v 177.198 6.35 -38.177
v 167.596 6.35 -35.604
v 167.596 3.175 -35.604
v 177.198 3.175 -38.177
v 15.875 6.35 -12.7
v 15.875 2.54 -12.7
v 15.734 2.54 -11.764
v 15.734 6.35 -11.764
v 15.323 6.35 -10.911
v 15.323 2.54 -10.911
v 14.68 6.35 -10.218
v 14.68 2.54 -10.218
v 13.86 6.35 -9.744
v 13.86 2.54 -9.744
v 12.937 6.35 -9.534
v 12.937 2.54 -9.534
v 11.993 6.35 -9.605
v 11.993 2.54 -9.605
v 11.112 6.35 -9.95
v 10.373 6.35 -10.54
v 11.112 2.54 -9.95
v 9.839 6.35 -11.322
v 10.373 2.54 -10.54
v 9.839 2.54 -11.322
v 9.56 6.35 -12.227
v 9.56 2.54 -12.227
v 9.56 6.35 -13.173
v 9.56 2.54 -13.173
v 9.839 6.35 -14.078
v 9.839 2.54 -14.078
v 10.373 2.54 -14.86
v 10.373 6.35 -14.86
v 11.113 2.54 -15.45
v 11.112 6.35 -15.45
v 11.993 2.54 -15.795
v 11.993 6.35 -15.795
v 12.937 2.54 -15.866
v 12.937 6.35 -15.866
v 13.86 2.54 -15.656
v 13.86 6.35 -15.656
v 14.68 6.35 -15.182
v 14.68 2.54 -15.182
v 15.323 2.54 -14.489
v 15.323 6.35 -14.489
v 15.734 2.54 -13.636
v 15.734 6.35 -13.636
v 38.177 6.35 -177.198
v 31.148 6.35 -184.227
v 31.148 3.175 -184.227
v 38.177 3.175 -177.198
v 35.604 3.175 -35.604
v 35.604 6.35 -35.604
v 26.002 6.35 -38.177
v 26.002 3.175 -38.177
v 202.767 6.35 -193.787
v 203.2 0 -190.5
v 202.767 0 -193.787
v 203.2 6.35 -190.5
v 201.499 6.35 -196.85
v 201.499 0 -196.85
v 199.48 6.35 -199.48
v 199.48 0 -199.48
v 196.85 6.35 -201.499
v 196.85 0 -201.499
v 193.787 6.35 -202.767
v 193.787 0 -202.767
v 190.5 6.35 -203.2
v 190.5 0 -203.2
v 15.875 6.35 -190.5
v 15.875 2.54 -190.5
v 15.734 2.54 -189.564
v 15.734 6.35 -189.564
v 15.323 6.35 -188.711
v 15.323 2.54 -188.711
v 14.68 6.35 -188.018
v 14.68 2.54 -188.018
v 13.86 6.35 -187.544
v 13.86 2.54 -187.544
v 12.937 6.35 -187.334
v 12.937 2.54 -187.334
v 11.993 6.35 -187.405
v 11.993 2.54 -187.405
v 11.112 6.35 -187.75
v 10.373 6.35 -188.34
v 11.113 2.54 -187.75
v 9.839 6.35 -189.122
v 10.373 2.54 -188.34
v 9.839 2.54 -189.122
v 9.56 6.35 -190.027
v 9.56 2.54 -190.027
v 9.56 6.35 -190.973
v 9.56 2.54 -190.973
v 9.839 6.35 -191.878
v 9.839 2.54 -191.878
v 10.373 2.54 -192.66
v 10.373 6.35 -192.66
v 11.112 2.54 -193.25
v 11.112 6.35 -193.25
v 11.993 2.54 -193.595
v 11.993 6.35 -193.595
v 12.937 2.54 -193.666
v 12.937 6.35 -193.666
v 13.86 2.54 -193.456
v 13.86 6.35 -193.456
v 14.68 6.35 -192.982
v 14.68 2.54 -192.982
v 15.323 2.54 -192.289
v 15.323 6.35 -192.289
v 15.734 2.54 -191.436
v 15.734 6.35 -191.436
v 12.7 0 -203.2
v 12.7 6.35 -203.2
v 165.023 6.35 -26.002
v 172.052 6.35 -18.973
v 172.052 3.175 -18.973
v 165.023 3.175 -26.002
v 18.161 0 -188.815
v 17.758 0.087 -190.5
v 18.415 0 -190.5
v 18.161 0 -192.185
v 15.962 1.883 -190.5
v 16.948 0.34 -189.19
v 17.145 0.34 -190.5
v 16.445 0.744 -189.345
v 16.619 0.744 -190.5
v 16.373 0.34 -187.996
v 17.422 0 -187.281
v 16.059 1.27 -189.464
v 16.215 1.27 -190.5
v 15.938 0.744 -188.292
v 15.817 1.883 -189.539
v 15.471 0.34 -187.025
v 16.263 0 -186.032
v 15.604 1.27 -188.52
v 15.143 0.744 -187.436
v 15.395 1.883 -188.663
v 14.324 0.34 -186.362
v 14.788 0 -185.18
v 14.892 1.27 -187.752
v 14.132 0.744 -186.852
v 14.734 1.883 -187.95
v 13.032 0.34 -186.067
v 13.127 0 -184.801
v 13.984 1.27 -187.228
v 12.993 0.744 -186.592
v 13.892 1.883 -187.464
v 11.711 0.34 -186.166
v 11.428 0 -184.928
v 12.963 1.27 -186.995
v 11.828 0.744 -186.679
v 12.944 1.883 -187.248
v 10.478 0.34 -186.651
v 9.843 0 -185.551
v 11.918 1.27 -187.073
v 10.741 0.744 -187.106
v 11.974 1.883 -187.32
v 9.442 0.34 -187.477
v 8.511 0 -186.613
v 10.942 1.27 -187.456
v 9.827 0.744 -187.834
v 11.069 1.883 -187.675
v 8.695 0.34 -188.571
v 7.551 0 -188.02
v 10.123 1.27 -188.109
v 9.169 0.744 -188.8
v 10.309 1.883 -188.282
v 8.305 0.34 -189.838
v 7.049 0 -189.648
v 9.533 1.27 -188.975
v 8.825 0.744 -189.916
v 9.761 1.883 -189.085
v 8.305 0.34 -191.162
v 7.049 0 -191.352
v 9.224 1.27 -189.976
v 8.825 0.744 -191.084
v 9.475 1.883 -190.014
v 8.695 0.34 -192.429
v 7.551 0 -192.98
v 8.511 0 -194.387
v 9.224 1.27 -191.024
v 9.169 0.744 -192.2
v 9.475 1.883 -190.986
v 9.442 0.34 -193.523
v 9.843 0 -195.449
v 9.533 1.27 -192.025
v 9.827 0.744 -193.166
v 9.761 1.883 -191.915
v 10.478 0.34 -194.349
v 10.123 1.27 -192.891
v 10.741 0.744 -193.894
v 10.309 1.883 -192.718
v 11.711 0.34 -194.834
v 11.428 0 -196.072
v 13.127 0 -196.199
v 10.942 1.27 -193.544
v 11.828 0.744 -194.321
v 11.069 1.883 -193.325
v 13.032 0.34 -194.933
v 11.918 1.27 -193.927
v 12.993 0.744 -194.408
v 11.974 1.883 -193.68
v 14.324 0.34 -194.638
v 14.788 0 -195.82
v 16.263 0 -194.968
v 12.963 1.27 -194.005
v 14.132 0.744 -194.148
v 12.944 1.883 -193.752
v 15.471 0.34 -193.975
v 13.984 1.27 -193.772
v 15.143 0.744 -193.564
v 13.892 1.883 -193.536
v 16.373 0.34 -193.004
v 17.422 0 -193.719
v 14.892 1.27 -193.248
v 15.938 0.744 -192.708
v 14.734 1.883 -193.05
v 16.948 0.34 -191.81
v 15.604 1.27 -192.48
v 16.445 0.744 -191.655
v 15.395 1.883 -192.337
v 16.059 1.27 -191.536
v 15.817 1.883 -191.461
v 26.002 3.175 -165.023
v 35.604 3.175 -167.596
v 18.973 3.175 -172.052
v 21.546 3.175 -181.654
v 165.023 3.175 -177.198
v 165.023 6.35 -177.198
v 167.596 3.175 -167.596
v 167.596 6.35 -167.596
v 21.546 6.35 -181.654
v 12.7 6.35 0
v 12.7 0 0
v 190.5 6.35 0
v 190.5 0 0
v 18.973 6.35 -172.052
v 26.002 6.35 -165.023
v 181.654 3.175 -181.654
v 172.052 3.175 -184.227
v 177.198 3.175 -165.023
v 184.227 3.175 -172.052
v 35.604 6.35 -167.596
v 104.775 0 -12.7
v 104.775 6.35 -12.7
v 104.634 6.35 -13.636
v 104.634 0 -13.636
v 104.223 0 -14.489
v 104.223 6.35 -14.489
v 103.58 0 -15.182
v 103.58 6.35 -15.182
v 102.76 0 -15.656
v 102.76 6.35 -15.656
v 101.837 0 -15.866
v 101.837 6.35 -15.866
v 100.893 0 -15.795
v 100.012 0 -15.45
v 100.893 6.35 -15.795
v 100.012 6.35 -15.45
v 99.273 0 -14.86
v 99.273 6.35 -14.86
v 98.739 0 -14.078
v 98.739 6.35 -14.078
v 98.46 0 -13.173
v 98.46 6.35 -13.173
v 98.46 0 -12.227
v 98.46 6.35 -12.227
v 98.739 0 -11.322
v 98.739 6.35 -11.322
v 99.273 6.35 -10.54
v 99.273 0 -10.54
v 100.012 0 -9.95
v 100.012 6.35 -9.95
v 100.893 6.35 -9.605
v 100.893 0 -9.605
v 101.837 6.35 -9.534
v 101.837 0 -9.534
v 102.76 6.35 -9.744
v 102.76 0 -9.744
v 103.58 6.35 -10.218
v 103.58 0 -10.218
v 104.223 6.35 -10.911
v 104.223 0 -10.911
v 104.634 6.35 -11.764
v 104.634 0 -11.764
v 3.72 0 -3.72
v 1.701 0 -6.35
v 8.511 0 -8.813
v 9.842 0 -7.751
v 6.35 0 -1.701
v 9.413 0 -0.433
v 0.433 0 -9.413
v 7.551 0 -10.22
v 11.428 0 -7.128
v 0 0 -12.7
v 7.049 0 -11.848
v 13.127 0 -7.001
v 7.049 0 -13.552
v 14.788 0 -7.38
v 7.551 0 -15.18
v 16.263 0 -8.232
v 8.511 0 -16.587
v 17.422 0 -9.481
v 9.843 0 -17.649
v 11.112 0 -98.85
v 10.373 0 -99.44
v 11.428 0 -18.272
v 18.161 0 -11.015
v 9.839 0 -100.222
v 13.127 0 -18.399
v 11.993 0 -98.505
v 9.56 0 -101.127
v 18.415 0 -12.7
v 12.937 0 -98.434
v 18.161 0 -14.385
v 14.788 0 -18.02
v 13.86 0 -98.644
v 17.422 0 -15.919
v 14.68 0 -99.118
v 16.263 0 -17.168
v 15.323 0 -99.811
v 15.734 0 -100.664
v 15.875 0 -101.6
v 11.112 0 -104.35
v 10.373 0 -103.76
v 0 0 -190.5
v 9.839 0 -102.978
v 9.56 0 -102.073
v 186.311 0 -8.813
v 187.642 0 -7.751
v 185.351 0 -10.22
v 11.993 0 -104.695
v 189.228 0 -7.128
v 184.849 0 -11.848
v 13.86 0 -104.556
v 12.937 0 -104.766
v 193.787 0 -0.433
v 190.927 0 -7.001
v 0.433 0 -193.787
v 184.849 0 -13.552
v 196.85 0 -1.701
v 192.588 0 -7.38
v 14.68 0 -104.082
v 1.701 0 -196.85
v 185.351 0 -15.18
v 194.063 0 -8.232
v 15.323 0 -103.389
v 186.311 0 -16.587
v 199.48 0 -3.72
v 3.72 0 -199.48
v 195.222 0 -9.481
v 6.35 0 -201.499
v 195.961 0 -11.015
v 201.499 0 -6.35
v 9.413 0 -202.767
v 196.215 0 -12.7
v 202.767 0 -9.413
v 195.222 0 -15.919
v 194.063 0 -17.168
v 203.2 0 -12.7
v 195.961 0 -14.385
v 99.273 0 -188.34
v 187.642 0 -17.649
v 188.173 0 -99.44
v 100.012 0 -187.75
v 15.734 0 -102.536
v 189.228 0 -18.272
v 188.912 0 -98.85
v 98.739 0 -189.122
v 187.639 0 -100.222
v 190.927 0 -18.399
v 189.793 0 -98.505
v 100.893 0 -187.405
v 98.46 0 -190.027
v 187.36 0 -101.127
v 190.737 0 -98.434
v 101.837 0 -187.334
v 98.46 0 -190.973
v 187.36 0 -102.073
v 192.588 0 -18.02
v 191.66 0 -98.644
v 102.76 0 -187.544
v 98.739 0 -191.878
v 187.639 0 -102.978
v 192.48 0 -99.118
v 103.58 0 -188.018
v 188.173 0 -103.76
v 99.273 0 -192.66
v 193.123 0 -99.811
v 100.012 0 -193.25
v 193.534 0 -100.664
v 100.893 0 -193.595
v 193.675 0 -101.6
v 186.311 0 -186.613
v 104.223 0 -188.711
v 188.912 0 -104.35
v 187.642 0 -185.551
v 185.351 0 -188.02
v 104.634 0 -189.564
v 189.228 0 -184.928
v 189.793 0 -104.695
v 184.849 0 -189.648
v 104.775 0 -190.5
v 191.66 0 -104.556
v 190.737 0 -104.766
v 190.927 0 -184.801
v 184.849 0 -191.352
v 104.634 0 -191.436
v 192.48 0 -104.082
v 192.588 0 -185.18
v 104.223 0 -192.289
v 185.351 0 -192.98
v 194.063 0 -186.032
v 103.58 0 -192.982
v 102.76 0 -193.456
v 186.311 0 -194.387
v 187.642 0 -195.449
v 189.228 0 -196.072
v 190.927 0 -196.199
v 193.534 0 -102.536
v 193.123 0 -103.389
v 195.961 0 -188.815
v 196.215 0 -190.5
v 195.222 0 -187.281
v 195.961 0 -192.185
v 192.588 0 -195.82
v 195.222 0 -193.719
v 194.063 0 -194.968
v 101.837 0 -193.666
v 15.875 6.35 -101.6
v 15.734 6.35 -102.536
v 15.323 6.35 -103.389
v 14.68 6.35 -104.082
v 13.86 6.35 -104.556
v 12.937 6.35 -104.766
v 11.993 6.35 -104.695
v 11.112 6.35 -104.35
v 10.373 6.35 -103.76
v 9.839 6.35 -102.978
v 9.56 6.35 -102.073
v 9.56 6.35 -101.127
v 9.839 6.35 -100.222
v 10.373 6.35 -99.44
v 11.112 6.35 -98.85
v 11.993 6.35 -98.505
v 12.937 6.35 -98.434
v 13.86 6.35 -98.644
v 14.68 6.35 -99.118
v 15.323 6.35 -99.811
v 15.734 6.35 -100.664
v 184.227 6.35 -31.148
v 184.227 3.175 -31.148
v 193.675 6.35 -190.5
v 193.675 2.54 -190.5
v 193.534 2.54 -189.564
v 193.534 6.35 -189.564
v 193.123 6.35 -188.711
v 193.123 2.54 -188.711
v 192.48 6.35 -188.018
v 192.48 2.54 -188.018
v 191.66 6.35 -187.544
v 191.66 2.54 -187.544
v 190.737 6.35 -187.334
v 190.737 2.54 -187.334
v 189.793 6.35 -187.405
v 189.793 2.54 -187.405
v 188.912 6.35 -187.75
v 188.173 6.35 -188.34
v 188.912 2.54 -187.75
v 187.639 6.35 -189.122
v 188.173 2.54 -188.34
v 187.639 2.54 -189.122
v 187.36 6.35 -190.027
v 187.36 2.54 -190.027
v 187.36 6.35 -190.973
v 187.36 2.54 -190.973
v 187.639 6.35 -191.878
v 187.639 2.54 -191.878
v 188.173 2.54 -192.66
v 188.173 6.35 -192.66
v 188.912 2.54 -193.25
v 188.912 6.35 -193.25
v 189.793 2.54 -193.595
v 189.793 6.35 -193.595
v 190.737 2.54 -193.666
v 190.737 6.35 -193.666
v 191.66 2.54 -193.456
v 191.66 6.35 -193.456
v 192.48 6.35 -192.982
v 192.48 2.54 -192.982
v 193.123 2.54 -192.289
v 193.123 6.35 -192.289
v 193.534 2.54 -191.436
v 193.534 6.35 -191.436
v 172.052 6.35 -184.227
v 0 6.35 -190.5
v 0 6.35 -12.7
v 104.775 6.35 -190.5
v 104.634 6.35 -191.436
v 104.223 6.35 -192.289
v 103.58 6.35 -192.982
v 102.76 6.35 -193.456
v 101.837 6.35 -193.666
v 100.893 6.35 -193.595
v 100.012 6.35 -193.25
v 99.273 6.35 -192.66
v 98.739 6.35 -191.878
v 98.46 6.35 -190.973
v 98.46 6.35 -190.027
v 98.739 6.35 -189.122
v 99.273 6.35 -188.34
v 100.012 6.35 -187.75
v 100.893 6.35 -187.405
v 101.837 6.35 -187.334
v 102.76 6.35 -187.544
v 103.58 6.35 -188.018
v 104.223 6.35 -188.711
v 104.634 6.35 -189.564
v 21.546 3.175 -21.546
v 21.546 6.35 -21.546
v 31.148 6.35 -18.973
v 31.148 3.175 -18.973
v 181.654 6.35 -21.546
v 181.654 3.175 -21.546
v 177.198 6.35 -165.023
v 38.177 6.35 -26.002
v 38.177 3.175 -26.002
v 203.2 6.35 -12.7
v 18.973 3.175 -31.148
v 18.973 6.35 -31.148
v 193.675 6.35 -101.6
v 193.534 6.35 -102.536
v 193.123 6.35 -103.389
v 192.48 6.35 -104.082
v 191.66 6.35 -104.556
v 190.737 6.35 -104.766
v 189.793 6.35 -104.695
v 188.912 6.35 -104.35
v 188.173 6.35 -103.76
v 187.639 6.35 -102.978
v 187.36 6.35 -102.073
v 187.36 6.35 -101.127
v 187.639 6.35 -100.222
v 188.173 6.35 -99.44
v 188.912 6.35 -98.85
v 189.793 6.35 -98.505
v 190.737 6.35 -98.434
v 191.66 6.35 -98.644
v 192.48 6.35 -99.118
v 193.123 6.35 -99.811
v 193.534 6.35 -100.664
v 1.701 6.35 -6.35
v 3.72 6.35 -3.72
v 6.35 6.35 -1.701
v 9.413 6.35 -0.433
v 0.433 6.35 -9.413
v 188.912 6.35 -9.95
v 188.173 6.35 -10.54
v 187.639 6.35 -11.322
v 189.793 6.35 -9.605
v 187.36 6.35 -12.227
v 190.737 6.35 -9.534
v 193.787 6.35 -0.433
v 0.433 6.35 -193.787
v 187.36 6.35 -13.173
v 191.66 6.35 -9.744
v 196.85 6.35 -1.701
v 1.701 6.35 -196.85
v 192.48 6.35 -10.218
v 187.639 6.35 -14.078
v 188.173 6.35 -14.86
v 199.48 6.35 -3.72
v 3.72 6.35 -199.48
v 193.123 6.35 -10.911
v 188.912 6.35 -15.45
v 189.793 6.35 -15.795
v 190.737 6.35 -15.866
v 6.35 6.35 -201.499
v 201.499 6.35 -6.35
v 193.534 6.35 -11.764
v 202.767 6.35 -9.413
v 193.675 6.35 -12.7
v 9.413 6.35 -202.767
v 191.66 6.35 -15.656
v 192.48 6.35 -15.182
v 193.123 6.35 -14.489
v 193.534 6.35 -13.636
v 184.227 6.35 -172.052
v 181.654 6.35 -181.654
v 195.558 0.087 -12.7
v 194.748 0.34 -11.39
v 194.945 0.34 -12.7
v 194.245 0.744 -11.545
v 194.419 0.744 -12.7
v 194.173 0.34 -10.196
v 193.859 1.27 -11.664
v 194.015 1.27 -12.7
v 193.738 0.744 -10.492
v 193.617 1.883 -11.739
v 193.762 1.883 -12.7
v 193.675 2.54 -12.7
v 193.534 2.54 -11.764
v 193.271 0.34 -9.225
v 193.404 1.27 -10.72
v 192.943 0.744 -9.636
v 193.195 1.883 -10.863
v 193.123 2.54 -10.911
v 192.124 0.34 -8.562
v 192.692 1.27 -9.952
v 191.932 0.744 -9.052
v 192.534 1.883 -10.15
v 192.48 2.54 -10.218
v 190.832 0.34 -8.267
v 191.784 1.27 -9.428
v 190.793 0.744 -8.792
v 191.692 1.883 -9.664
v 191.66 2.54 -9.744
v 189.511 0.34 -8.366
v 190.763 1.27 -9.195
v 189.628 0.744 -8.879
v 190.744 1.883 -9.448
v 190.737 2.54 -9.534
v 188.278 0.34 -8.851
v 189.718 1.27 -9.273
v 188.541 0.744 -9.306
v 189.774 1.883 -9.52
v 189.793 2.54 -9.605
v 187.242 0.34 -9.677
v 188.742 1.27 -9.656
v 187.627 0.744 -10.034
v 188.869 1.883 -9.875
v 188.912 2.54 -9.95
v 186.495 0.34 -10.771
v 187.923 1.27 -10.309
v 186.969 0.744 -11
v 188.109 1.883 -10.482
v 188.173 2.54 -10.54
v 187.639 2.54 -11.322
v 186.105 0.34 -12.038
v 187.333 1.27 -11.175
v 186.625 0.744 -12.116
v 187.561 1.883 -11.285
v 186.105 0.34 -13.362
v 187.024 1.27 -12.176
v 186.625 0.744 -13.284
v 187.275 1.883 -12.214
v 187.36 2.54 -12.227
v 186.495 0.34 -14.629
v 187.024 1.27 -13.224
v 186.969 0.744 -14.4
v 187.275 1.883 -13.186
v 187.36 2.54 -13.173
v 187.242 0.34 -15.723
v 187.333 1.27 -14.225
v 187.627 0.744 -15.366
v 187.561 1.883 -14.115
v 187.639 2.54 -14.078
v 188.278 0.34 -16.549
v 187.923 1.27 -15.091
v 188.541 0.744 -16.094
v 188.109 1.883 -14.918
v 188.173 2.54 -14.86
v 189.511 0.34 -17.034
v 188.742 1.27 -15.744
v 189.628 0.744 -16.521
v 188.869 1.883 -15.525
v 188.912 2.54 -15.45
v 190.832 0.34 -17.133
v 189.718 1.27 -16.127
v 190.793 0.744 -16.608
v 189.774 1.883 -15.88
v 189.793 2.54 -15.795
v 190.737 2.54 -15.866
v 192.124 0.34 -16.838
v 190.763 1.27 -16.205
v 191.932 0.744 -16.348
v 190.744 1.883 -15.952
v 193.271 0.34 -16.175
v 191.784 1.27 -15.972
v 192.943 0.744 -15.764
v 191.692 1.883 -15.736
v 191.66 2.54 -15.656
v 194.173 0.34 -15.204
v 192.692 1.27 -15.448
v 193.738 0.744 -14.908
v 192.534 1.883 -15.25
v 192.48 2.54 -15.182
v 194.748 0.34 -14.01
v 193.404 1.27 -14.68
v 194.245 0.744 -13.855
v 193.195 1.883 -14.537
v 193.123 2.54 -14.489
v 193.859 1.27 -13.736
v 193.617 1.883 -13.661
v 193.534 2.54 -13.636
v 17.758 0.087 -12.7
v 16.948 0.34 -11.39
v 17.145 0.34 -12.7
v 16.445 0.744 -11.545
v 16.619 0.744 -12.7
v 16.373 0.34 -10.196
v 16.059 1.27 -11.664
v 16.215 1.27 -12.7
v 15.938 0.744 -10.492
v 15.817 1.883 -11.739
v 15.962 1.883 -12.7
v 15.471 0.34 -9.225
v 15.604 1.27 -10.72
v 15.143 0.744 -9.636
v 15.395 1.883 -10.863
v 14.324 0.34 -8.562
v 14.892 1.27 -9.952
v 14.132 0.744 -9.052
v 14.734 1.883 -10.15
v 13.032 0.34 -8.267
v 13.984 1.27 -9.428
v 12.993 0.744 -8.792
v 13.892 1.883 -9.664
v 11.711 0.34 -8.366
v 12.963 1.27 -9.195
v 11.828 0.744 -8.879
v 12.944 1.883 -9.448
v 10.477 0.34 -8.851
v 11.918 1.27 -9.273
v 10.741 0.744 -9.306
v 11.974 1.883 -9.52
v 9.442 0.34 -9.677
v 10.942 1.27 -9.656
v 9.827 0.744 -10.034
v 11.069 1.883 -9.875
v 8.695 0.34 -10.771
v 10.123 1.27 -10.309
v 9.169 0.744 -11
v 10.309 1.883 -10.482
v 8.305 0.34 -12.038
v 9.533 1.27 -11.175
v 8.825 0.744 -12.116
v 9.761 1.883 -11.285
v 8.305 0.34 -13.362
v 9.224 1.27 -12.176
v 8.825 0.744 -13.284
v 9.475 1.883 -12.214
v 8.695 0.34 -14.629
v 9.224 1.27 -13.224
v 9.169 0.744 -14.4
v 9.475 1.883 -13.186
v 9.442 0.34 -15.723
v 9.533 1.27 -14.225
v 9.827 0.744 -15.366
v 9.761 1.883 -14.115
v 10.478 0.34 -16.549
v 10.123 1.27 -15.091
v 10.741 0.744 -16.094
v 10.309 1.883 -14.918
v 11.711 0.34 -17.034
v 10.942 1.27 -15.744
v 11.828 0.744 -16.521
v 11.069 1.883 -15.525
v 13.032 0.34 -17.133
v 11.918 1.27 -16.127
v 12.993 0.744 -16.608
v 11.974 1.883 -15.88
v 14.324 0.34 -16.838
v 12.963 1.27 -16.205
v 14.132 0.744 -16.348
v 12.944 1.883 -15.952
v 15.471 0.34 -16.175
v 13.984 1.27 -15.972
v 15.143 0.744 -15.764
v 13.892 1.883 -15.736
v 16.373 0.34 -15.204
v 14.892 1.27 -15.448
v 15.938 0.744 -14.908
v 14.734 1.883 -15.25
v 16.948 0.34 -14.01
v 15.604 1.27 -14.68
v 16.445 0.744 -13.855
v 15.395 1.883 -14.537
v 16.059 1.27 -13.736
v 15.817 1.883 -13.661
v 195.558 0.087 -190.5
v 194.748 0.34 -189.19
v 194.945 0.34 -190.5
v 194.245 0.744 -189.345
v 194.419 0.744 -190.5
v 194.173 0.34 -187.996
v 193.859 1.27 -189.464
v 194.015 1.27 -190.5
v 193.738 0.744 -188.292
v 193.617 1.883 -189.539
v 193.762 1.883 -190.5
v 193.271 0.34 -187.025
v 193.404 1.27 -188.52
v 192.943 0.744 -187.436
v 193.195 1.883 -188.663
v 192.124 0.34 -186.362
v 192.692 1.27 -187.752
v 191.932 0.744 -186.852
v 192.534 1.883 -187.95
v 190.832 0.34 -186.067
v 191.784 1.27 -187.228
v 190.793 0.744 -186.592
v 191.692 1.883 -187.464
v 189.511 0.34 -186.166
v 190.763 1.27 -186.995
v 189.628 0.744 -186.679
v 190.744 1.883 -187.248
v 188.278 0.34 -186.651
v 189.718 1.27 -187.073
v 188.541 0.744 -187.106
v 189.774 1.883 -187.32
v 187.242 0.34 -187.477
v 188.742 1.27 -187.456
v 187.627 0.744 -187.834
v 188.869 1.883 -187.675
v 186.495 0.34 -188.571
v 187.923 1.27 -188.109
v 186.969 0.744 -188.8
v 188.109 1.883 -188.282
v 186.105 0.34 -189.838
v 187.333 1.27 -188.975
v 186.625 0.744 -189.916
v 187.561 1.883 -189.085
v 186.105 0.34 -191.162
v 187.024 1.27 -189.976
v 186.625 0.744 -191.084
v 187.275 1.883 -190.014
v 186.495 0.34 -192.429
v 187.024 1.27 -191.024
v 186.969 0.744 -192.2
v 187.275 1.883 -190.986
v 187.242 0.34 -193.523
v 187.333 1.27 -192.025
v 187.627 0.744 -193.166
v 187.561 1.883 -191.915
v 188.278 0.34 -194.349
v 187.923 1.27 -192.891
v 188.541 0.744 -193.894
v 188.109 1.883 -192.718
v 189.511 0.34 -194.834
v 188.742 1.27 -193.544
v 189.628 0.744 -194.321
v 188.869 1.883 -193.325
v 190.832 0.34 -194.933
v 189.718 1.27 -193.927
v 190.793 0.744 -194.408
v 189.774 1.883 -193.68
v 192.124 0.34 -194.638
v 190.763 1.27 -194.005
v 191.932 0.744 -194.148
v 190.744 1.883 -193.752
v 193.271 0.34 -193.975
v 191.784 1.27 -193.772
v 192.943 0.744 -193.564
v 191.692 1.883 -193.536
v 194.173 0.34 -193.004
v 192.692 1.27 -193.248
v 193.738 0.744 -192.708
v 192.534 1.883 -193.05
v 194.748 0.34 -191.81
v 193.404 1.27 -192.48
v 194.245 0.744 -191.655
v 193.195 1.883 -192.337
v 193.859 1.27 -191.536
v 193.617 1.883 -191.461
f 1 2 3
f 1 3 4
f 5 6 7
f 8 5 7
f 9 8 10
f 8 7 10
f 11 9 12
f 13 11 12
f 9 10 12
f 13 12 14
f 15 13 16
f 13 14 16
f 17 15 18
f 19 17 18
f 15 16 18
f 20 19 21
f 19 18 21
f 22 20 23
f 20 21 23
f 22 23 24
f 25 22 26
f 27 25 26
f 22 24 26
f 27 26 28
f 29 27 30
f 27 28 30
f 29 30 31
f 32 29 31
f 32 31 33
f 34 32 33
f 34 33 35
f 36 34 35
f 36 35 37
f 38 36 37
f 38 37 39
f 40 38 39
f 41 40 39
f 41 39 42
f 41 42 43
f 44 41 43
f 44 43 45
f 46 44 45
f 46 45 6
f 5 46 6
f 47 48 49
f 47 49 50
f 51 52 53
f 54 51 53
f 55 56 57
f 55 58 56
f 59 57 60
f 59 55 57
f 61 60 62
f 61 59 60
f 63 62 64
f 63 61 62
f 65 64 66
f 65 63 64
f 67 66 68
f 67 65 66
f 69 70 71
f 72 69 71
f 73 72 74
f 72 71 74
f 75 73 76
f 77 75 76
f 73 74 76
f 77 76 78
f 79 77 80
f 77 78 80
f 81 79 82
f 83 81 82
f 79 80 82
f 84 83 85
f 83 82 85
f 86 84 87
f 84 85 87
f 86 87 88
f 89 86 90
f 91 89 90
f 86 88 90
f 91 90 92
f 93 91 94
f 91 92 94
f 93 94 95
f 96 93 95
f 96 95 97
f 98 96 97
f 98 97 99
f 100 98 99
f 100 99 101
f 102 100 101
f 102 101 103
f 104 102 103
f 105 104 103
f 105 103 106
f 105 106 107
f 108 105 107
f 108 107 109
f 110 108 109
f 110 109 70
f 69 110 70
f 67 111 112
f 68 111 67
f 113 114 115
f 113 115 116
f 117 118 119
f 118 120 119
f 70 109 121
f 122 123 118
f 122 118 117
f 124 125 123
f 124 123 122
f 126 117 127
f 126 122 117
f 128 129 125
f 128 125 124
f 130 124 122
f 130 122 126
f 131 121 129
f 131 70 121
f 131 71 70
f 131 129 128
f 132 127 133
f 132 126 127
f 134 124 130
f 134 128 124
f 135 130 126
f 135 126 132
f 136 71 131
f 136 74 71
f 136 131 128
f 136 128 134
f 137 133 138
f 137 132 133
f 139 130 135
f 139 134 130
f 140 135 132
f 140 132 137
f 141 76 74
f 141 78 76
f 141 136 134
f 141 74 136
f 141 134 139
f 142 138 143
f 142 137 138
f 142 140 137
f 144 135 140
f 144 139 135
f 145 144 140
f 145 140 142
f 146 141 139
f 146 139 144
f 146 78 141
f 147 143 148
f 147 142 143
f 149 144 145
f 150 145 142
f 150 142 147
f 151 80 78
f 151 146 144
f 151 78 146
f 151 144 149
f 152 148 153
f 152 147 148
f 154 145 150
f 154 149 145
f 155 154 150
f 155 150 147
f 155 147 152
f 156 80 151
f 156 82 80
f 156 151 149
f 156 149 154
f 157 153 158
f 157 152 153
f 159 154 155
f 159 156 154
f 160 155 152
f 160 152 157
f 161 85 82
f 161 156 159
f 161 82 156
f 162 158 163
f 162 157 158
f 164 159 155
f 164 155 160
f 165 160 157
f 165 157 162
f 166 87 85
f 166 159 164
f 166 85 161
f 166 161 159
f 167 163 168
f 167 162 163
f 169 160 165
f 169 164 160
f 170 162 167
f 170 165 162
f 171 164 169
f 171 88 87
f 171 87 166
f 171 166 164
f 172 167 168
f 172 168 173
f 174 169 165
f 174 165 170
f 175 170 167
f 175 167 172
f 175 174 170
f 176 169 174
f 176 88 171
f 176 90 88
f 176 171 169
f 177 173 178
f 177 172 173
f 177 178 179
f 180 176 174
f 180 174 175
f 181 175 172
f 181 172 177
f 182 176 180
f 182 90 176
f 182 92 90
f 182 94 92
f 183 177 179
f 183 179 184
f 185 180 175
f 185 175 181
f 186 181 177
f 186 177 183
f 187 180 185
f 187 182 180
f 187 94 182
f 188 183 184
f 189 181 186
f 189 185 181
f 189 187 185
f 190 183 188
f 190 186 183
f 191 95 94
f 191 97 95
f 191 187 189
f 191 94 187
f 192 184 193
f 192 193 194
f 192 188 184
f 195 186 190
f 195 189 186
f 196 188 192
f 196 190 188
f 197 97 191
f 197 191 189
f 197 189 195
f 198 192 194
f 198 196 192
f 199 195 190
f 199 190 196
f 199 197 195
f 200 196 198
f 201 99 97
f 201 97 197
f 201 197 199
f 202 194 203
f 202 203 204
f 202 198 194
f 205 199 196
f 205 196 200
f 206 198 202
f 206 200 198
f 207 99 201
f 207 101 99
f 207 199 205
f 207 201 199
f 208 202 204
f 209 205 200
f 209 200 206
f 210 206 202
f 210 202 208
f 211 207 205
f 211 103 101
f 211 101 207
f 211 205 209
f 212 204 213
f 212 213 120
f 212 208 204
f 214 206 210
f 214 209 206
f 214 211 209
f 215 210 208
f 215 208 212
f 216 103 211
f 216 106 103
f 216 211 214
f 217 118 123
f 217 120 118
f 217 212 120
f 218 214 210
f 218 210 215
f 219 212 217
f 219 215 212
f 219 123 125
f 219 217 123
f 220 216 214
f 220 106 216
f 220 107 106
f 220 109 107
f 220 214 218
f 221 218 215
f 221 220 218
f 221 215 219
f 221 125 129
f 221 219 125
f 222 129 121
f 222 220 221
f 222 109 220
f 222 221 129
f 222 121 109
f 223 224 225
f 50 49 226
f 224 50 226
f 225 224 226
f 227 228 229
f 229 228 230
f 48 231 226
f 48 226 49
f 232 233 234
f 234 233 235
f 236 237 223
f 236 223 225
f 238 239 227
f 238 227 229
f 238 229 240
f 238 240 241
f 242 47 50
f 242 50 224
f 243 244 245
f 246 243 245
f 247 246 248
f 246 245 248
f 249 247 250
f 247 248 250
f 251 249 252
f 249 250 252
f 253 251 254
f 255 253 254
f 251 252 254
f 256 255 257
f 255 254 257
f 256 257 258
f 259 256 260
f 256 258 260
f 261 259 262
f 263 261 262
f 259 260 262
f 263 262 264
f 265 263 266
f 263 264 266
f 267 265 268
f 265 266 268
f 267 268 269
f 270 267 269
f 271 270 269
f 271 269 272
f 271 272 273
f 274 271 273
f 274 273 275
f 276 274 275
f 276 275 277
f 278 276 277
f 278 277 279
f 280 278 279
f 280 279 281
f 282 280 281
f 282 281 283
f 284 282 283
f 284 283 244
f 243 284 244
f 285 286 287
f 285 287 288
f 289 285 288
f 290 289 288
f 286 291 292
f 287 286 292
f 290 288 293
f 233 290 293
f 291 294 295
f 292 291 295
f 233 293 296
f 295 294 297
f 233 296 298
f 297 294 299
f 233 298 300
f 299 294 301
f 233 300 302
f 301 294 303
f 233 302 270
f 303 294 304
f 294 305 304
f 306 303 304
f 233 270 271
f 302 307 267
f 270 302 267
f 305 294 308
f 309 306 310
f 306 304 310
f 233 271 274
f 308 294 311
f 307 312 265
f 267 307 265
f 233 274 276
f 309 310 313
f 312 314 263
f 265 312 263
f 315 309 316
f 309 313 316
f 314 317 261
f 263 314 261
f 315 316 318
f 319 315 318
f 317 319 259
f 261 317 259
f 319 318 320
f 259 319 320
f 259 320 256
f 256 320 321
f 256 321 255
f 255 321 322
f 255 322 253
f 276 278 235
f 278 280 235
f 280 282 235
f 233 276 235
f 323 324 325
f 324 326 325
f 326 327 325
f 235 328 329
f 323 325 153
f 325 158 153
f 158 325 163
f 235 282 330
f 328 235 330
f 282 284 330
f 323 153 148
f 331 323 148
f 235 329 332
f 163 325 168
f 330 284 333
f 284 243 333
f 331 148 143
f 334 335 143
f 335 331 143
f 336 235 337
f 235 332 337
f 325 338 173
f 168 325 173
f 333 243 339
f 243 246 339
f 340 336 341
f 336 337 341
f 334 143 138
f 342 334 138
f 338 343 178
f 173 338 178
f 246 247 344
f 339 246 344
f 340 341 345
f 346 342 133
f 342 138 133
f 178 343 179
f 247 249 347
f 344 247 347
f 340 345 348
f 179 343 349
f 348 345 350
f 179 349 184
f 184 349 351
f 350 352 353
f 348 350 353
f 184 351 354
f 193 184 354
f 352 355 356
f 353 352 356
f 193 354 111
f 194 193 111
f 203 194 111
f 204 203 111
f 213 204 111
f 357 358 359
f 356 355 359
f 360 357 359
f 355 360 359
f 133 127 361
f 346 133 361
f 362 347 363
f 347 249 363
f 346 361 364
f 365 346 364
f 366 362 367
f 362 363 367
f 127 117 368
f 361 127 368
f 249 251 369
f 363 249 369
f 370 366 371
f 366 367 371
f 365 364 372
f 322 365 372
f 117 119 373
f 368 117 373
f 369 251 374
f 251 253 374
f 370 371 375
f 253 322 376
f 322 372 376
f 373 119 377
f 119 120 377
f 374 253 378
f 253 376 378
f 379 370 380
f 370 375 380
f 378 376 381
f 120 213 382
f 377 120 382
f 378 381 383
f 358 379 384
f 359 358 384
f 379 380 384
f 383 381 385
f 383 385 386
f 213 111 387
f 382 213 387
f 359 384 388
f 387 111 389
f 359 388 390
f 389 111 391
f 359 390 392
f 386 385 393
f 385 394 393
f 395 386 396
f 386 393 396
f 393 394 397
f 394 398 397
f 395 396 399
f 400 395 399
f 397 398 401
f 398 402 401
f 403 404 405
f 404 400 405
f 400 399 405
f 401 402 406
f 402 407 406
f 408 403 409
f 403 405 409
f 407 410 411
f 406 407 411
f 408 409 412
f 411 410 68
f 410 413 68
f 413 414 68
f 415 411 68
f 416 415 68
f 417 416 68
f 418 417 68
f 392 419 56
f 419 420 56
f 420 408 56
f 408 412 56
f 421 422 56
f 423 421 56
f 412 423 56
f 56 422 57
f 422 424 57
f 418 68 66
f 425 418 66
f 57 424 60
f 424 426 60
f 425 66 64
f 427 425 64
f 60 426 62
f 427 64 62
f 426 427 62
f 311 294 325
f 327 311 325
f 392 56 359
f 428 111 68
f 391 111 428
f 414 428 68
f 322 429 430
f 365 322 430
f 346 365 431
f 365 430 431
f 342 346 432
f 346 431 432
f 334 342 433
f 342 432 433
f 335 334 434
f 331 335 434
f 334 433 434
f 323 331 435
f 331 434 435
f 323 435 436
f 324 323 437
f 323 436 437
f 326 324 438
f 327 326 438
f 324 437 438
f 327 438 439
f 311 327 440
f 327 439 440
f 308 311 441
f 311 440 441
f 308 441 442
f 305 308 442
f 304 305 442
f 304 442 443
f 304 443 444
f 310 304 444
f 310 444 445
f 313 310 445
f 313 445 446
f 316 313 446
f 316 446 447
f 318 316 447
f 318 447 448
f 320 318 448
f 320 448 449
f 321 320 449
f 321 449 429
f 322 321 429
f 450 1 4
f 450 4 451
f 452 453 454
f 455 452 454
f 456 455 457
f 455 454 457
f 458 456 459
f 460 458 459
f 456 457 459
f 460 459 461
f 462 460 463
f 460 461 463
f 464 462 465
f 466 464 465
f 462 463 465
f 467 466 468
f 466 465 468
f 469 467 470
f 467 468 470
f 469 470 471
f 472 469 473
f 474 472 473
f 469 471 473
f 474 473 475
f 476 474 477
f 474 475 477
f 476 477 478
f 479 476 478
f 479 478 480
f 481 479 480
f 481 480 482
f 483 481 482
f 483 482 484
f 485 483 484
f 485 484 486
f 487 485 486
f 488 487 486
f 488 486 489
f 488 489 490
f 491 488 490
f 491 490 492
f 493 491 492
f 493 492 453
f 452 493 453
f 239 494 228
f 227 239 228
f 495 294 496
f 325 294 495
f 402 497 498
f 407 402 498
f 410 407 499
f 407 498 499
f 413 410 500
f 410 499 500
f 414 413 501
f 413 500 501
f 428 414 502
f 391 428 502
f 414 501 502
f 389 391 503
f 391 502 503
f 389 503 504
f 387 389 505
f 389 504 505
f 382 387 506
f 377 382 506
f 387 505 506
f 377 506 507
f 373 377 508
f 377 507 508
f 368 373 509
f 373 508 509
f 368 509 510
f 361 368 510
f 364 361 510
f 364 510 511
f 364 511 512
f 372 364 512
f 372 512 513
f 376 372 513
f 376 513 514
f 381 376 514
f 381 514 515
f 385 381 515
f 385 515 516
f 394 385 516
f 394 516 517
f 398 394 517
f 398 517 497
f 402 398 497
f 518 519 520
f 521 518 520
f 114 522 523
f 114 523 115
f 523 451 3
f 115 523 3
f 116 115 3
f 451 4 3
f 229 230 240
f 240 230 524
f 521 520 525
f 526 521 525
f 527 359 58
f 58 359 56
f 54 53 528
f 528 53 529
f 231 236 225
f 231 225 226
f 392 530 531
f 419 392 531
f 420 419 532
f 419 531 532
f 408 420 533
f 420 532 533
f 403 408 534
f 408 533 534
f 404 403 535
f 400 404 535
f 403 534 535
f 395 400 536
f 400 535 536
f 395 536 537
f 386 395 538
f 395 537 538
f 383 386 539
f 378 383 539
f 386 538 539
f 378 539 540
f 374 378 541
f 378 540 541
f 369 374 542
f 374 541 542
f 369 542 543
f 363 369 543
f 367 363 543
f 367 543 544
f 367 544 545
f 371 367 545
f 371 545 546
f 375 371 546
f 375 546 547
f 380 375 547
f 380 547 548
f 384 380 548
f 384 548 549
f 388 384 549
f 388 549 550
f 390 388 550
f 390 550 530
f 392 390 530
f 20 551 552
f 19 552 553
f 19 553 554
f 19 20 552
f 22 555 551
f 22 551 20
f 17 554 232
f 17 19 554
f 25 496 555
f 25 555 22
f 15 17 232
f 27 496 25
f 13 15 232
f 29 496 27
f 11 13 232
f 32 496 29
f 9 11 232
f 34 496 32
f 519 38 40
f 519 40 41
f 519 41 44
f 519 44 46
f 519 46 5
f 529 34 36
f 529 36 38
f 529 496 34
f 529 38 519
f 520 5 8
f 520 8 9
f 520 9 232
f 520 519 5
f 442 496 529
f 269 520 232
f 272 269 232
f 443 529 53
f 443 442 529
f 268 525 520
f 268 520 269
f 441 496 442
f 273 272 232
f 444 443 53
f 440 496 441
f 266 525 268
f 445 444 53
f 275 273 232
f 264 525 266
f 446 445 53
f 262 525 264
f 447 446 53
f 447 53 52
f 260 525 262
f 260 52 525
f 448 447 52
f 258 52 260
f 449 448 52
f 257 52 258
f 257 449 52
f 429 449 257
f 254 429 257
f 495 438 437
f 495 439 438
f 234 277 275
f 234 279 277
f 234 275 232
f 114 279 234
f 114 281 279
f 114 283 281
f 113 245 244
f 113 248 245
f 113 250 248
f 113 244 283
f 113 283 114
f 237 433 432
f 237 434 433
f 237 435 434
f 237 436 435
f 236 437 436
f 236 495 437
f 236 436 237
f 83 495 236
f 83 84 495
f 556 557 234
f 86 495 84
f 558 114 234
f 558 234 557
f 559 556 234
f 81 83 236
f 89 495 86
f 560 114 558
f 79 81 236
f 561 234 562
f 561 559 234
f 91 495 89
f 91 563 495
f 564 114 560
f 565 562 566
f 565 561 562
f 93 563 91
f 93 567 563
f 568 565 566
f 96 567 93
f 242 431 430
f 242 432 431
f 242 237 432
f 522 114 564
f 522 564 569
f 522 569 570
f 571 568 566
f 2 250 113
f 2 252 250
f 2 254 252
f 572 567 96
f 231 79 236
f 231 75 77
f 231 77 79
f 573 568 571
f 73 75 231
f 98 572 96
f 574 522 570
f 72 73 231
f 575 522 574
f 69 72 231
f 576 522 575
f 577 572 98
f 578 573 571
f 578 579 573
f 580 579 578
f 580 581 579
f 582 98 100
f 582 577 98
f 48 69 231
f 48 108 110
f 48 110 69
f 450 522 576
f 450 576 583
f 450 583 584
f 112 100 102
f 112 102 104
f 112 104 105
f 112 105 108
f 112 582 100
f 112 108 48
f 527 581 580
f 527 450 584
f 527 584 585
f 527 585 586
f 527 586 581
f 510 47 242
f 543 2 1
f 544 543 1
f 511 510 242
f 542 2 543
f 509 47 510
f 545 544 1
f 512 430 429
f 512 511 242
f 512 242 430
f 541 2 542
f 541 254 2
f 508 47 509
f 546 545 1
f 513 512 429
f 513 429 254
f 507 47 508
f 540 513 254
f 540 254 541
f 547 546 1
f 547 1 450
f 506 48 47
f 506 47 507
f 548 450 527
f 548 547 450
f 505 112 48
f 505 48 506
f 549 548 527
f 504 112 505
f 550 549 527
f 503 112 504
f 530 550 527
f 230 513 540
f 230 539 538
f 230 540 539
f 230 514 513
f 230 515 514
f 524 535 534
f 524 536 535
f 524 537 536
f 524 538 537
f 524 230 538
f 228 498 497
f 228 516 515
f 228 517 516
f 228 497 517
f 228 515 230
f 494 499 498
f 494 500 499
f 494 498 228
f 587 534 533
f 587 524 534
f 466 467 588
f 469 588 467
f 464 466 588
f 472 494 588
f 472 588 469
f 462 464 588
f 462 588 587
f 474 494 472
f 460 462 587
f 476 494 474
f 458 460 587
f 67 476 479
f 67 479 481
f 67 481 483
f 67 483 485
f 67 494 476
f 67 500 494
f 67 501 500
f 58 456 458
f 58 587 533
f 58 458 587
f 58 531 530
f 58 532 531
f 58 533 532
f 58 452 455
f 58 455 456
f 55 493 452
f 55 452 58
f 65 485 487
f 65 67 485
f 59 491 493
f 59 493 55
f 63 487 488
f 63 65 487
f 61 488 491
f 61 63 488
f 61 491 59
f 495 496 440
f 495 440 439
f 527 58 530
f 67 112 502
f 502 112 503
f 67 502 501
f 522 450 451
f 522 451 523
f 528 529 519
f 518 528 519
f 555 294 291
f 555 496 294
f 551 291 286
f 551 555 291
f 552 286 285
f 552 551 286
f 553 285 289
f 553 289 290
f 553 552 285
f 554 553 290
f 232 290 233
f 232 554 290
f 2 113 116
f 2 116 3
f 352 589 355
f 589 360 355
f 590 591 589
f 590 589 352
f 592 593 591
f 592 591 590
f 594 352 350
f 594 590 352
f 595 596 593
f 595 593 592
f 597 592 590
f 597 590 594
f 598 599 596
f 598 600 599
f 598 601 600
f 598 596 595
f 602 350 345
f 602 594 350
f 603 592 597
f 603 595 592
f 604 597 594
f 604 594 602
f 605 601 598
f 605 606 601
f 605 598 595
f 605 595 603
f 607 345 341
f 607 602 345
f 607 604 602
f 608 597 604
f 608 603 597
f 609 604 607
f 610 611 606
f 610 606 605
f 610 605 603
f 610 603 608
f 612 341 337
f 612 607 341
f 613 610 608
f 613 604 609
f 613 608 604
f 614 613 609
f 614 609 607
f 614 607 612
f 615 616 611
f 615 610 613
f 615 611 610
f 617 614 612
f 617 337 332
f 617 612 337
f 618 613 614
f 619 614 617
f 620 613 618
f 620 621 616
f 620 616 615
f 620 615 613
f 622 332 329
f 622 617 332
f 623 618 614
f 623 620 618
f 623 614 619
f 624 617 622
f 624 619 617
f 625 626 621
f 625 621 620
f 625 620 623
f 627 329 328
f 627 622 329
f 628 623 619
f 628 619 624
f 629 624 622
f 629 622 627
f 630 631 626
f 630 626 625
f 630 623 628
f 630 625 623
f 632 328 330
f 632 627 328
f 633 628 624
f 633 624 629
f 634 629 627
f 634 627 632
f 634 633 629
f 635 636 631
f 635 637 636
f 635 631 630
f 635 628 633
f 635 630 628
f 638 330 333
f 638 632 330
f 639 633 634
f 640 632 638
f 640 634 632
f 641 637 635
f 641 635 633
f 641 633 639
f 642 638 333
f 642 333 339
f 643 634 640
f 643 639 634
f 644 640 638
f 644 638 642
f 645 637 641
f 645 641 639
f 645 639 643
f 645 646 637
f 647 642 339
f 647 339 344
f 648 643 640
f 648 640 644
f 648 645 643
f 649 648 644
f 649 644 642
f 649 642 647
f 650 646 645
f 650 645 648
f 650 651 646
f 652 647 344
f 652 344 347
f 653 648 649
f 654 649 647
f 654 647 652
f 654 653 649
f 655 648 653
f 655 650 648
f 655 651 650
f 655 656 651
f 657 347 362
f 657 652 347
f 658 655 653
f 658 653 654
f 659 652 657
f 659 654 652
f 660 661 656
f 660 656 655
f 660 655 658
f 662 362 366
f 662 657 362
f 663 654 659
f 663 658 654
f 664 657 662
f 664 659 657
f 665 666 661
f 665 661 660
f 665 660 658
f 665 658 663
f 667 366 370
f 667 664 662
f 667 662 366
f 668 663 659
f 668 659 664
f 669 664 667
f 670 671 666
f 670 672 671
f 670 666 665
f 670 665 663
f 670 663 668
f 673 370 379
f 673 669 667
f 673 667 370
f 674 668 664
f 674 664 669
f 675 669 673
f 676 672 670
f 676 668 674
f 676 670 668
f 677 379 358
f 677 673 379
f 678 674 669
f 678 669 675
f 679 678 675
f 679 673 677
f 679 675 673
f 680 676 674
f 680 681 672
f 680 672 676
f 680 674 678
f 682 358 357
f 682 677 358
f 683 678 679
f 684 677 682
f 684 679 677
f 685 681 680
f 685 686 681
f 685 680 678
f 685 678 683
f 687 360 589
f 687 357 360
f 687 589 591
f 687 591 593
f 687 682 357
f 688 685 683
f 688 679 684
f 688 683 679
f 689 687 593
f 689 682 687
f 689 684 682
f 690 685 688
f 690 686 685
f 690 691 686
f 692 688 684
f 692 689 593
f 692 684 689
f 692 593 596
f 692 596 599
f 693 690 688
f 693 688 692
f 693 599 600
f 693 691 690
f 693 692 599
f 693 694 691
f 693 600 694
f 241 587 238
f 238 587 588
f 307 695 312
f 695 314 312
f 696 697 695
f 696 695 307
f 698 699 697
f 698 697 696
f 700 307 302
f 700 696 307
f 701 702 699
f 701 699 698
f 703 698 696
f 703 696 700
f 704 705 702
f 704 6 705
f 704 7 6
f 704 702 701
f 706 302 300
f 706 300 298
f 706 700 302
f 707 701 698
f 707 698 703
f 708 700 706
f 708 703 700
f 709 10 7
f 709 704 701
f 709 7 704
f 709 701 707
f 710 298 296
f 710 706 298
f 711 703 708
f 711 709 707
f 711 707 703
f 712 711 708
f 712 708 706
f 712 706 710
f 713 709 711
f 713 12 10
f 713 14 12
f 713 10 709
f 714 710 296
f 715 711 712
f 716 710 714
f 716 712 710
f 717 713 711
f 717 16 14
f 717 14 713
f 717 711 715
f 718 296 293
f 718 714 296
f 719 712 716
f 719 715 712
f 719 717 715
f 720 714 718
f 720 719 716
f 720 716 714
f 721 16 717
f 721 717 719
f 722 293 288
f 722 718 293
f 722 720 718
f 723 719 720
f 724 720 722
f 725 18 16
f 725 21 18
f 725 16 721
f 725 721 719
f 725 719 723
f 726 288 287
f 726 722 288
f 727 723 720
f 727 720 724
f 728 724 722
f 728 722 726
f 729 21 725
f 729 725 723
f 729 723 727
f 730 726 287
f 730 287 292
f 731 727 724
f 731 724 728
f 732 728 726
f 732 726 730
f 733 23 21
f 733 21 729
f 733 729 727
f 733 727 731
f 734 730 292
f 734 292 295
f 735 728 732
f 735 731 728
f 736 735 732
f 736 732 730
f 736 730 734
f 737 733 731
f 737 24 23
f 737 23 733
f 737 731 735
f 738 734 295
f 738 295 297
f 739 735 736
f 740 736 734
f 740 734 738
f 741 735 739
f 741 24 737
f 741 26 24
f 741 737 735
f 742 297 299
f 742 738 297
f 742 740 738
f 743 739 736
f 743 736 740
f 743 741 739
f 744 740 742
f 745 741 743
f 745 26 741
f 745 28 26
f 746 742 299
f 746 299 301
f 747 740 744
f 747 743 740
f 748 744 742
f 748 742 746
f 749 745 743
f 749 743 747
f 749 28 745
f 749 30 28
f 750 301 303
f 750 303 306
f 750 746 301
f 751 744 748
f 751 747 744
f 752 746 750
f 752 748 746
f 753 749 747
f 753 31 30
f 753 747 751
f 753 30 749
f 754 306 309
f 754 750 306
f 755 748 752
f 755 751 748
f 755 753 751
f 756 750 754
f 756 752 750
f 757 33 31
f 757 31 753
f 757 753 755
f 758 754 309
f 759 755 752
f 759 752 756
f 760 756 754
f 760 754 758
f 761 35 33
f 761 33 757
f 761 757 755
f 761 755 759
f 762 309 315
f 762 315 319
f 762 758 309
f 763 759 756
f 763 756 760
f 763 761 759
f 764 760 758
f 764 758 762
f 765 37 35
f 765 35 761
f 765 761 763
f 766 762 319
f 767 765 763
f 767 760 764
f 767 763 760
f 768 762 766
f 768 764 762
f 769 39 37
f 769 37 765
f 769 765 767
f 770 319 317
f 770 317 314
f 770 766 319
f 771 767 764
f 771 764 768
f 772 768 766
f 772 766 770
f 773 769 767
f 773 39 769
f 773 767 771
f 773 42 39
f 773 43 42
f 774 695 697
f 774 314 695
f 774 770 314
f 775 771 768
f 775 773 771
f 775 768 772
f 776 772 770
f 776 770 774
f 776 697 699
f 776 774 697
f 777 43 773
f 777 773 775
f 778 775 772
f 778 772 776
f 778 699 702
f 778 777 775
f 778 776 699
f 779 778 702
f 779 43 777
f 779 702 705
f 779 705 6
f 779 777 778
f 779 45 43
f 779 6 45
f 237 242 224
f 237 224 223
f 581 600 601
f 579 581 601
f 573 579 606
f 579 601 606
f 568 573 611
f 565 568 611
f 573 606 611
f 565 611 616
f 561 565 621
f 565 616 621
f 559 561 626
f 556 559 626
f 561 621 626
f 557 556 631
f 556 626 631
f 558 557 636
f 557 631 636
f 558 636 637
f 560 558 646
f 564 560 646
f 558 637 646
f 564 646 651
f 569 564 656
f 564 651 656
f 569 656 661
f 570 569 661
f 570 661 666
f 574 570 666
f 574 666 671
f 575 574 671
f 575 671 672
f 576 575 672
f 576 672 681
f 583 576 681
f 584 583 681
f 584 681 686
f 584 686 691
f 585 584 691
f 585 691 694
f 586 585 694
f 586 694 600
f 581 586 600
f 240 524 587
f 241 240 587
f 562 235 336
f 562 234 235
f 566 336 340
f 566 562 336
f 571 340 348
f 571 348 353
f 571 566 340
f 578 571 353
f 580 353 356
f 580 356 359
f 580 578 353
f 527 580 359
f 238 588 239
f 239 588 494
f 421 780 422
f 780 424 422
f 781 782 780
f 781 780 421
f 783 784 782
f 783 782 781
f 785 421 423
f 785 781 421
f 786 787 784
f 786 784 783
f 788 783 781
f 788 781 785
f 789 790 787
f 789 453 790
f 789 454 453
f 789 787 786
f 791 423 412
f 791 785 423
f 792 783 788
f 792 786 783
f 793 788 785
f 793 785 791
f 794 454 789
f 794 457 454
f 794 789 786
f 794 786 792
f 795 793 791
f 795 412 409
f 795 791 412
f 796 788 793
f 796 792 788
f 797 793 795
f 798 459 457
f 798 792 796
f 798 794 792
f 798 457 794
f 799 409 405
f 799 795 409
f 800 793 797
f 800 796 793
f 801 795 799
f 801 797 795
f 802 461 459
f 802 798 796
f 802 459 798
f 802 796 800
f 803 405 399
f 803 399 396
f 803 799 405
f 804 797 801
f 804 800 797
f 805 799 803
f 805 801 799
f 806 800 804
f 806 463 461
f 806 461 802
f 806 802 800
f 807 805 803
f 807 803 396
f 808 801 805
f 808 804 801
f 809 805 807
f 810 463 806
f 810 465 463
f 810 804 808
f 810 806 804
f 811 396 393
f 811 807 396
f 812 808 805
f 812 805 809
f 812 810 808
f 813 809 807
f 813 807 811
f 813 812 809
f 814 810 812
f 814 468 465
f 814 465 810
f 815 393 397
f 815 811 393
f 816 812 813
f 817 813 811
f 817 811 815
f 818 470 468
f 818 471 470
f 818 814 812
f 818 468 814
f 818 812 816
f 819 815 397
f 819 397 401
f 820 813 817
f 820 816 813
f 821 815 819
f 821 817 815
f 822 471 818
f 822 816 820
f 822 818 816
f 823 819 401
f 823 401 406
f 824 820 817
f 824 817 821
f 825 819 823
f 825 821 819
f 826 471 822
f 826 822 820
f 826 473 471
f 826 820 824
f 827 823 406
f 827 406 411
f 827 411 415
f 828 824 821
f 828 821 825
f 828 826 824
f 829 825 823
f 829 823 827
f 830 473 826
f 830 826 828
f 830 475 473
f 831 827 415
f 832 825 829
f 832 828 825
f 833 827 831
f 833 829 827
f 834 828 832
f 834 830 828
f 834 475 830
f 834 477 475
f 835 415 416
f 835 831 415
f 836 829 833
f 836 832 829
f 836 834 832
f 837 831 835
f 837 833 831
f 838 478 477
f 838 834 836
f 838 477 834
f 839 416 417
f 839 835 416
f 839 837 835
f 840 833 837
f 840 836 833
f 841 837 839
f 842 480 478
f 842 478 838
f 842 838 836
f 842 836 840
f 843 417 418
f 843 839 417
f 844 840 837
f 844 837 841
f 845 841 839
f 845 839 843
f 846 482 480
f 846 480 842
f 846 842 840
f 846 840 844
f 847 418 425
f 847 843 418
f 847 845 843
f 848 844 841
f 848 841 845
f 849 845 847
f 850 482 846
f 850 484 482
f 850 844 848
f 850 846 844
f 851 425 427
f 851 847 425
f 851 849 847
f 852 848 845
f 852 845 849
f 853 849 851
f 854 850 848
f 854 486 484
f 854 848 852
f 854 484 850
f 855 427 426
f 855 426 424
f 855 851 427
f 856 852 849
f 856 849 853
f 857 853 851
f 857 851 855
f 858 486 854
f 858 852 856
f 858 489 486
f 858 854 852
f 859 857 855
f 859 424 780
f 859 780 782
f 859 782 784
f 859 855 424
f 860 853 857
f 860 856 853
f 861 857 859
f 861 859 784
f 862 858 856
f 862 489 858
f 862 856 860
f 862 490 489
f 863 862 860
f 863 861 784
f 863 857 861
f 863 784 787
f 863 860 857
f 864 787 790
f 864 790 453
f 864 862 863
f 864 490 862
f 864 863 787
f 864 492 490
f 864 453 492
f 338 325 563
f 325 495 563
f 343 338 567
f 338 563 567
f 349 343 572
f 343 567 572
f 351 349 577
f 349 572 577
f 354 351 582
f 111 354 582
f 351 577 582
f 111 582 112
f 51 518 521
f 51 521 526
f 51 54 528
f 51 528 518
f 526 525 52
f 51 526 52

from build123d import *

# Parameters (mm, degrees)
SKETCH1_W           = 203.2
SKETCH1_H           = 203.2
BOSS_EXTRUDE1_DEPTH = 6.35
FILLET1_R           = 12.7
SKETCH2_R           = 3.175
CUT_EXTRUDE1_DEPTH  = 7.35
CUT_EXTRUDE2_DEPTH  = 3.175
FILLET2_R           = 2.54
SKETCH23_R          = 3.175
CUT_EXTRUDE3_DEPTH  = 7.35


with BuildPart() as part:
    # Sketch1 → Boss-Extrude1 (new body)
    with BuildSketch(Plane(origin=(0, 0, 0), x_dir=(1, 0, 0), z_dir=(0, 1, 0))):
        with Locations((101.6, 101.6)):
            Rectangle(SKETCH1_W, SKETCH1_H)
    extrude(amount=BOSS_EXTRUDE1_DEPTH)

    # Fillet1
    fillet1_edges = [part.edges().sort_by_distance(p)[0] for p in [
        (0, 3.175, -203.2),
        (203.2, 3.175, -203.2),
        (203.2, 3.175, 0),
        (0, 3.175, 0),
    ]]
    fillet(fillet1_edges, radius=FILLET1_R)

    # Sketch2 → Cut-Extrude1 (cut, through all)
    with BuildSketch(Plane.XZ):
        with Locations((12.7, -12.7)):
            Circle(SKETCH2_R)
        with Locations((190.5, -12.7)):
            Circle(SKETCH2_R)
        with Locations((190.5, -190.5)):
            Circle(SKETCH2_R)
        with Locations((12.7, -190.5)):
            Circle(SKETCH2_R)
    extrude(amount=-CUT_EXTRUDE1_DEPTH, mode=Mode.SUBTRACT)

    # Sketch22 → Cut-Extrude2 (cut)
    with BuildSketch(Plane(origin=(0, 6.35, 0), x_dir=(1, 0, 0), z_dir=(0, 1, 0))):
        Polygon((181.654219065, 181.654219065), (172.052127253, 184.227091812), (165.022908188, 177.197872747), (167.595780935, 167.595780935), (177.197872747, 165.022908188), (184.227091812, 172.052127253), align=None)
        Polygon((18.972908188, 172.052127253), (21.545780935, 181.654219065), (31.147872747, 184.227091812), (38.177091812, 177.197872747), (35.604219065, 167.595780935), (26.002127253, 165.022908188), align=None)
        Polygon((184.227091812, 31.147872747), (181.654219065, 21.545780935), (172.052127253, 18.972908188), (165.022908188, 26.002127253), (167.595780935, 35.604219065), (177.197872747, 38.177091812), align=None)
        Polygon((21.545780935, 21.545780935), (31.147872747, 18.972908188), (38.177091812, 26.002127253), (35.604219065, 35.604219065), (26.002127253, 38.177091812), (18.972908188, 31.147872747), align=None)
    extrude(amount=-CUT_EXTRUDE2_DEPTH, mode=Mode.SUBTRACT)

    # Fillet2
    fillet2_edges = [part.edges().sort_by_distance(p)[0] for p in [
        (9.525, 0, -190.5),
        (187.325, 0, -190.5),
        (187.325, 0, -12.7),
        (9.525, 0, -12.7),
    ]]
    fillet(fillet2_edges, radius=FILLET2_R)

    # Sketch23 → Cut-Extrude3 (cut, through all)
    with BuildSketch(Plane(origin=(0, 6.35, 0), x_dir=(1, 0, 0), z_dir=(0, 1, 0))):
        with Locations((190.5, 101.6)):
            Circle(SKETCH23_R)
        with Locations((101.6, 12.7)):
            Circle(SKETCH23_R)
        with Locations((12.7, 101.6)):
            Circle(SKETCH23_R)
        with Locations((101.6, 190.5)):
            Circle(SKETCH23_R)
    extrude(amount=-CUT_EXTRUDE3_DEPTH, mode=Mode.SUBTRACT)


solid = part.part
